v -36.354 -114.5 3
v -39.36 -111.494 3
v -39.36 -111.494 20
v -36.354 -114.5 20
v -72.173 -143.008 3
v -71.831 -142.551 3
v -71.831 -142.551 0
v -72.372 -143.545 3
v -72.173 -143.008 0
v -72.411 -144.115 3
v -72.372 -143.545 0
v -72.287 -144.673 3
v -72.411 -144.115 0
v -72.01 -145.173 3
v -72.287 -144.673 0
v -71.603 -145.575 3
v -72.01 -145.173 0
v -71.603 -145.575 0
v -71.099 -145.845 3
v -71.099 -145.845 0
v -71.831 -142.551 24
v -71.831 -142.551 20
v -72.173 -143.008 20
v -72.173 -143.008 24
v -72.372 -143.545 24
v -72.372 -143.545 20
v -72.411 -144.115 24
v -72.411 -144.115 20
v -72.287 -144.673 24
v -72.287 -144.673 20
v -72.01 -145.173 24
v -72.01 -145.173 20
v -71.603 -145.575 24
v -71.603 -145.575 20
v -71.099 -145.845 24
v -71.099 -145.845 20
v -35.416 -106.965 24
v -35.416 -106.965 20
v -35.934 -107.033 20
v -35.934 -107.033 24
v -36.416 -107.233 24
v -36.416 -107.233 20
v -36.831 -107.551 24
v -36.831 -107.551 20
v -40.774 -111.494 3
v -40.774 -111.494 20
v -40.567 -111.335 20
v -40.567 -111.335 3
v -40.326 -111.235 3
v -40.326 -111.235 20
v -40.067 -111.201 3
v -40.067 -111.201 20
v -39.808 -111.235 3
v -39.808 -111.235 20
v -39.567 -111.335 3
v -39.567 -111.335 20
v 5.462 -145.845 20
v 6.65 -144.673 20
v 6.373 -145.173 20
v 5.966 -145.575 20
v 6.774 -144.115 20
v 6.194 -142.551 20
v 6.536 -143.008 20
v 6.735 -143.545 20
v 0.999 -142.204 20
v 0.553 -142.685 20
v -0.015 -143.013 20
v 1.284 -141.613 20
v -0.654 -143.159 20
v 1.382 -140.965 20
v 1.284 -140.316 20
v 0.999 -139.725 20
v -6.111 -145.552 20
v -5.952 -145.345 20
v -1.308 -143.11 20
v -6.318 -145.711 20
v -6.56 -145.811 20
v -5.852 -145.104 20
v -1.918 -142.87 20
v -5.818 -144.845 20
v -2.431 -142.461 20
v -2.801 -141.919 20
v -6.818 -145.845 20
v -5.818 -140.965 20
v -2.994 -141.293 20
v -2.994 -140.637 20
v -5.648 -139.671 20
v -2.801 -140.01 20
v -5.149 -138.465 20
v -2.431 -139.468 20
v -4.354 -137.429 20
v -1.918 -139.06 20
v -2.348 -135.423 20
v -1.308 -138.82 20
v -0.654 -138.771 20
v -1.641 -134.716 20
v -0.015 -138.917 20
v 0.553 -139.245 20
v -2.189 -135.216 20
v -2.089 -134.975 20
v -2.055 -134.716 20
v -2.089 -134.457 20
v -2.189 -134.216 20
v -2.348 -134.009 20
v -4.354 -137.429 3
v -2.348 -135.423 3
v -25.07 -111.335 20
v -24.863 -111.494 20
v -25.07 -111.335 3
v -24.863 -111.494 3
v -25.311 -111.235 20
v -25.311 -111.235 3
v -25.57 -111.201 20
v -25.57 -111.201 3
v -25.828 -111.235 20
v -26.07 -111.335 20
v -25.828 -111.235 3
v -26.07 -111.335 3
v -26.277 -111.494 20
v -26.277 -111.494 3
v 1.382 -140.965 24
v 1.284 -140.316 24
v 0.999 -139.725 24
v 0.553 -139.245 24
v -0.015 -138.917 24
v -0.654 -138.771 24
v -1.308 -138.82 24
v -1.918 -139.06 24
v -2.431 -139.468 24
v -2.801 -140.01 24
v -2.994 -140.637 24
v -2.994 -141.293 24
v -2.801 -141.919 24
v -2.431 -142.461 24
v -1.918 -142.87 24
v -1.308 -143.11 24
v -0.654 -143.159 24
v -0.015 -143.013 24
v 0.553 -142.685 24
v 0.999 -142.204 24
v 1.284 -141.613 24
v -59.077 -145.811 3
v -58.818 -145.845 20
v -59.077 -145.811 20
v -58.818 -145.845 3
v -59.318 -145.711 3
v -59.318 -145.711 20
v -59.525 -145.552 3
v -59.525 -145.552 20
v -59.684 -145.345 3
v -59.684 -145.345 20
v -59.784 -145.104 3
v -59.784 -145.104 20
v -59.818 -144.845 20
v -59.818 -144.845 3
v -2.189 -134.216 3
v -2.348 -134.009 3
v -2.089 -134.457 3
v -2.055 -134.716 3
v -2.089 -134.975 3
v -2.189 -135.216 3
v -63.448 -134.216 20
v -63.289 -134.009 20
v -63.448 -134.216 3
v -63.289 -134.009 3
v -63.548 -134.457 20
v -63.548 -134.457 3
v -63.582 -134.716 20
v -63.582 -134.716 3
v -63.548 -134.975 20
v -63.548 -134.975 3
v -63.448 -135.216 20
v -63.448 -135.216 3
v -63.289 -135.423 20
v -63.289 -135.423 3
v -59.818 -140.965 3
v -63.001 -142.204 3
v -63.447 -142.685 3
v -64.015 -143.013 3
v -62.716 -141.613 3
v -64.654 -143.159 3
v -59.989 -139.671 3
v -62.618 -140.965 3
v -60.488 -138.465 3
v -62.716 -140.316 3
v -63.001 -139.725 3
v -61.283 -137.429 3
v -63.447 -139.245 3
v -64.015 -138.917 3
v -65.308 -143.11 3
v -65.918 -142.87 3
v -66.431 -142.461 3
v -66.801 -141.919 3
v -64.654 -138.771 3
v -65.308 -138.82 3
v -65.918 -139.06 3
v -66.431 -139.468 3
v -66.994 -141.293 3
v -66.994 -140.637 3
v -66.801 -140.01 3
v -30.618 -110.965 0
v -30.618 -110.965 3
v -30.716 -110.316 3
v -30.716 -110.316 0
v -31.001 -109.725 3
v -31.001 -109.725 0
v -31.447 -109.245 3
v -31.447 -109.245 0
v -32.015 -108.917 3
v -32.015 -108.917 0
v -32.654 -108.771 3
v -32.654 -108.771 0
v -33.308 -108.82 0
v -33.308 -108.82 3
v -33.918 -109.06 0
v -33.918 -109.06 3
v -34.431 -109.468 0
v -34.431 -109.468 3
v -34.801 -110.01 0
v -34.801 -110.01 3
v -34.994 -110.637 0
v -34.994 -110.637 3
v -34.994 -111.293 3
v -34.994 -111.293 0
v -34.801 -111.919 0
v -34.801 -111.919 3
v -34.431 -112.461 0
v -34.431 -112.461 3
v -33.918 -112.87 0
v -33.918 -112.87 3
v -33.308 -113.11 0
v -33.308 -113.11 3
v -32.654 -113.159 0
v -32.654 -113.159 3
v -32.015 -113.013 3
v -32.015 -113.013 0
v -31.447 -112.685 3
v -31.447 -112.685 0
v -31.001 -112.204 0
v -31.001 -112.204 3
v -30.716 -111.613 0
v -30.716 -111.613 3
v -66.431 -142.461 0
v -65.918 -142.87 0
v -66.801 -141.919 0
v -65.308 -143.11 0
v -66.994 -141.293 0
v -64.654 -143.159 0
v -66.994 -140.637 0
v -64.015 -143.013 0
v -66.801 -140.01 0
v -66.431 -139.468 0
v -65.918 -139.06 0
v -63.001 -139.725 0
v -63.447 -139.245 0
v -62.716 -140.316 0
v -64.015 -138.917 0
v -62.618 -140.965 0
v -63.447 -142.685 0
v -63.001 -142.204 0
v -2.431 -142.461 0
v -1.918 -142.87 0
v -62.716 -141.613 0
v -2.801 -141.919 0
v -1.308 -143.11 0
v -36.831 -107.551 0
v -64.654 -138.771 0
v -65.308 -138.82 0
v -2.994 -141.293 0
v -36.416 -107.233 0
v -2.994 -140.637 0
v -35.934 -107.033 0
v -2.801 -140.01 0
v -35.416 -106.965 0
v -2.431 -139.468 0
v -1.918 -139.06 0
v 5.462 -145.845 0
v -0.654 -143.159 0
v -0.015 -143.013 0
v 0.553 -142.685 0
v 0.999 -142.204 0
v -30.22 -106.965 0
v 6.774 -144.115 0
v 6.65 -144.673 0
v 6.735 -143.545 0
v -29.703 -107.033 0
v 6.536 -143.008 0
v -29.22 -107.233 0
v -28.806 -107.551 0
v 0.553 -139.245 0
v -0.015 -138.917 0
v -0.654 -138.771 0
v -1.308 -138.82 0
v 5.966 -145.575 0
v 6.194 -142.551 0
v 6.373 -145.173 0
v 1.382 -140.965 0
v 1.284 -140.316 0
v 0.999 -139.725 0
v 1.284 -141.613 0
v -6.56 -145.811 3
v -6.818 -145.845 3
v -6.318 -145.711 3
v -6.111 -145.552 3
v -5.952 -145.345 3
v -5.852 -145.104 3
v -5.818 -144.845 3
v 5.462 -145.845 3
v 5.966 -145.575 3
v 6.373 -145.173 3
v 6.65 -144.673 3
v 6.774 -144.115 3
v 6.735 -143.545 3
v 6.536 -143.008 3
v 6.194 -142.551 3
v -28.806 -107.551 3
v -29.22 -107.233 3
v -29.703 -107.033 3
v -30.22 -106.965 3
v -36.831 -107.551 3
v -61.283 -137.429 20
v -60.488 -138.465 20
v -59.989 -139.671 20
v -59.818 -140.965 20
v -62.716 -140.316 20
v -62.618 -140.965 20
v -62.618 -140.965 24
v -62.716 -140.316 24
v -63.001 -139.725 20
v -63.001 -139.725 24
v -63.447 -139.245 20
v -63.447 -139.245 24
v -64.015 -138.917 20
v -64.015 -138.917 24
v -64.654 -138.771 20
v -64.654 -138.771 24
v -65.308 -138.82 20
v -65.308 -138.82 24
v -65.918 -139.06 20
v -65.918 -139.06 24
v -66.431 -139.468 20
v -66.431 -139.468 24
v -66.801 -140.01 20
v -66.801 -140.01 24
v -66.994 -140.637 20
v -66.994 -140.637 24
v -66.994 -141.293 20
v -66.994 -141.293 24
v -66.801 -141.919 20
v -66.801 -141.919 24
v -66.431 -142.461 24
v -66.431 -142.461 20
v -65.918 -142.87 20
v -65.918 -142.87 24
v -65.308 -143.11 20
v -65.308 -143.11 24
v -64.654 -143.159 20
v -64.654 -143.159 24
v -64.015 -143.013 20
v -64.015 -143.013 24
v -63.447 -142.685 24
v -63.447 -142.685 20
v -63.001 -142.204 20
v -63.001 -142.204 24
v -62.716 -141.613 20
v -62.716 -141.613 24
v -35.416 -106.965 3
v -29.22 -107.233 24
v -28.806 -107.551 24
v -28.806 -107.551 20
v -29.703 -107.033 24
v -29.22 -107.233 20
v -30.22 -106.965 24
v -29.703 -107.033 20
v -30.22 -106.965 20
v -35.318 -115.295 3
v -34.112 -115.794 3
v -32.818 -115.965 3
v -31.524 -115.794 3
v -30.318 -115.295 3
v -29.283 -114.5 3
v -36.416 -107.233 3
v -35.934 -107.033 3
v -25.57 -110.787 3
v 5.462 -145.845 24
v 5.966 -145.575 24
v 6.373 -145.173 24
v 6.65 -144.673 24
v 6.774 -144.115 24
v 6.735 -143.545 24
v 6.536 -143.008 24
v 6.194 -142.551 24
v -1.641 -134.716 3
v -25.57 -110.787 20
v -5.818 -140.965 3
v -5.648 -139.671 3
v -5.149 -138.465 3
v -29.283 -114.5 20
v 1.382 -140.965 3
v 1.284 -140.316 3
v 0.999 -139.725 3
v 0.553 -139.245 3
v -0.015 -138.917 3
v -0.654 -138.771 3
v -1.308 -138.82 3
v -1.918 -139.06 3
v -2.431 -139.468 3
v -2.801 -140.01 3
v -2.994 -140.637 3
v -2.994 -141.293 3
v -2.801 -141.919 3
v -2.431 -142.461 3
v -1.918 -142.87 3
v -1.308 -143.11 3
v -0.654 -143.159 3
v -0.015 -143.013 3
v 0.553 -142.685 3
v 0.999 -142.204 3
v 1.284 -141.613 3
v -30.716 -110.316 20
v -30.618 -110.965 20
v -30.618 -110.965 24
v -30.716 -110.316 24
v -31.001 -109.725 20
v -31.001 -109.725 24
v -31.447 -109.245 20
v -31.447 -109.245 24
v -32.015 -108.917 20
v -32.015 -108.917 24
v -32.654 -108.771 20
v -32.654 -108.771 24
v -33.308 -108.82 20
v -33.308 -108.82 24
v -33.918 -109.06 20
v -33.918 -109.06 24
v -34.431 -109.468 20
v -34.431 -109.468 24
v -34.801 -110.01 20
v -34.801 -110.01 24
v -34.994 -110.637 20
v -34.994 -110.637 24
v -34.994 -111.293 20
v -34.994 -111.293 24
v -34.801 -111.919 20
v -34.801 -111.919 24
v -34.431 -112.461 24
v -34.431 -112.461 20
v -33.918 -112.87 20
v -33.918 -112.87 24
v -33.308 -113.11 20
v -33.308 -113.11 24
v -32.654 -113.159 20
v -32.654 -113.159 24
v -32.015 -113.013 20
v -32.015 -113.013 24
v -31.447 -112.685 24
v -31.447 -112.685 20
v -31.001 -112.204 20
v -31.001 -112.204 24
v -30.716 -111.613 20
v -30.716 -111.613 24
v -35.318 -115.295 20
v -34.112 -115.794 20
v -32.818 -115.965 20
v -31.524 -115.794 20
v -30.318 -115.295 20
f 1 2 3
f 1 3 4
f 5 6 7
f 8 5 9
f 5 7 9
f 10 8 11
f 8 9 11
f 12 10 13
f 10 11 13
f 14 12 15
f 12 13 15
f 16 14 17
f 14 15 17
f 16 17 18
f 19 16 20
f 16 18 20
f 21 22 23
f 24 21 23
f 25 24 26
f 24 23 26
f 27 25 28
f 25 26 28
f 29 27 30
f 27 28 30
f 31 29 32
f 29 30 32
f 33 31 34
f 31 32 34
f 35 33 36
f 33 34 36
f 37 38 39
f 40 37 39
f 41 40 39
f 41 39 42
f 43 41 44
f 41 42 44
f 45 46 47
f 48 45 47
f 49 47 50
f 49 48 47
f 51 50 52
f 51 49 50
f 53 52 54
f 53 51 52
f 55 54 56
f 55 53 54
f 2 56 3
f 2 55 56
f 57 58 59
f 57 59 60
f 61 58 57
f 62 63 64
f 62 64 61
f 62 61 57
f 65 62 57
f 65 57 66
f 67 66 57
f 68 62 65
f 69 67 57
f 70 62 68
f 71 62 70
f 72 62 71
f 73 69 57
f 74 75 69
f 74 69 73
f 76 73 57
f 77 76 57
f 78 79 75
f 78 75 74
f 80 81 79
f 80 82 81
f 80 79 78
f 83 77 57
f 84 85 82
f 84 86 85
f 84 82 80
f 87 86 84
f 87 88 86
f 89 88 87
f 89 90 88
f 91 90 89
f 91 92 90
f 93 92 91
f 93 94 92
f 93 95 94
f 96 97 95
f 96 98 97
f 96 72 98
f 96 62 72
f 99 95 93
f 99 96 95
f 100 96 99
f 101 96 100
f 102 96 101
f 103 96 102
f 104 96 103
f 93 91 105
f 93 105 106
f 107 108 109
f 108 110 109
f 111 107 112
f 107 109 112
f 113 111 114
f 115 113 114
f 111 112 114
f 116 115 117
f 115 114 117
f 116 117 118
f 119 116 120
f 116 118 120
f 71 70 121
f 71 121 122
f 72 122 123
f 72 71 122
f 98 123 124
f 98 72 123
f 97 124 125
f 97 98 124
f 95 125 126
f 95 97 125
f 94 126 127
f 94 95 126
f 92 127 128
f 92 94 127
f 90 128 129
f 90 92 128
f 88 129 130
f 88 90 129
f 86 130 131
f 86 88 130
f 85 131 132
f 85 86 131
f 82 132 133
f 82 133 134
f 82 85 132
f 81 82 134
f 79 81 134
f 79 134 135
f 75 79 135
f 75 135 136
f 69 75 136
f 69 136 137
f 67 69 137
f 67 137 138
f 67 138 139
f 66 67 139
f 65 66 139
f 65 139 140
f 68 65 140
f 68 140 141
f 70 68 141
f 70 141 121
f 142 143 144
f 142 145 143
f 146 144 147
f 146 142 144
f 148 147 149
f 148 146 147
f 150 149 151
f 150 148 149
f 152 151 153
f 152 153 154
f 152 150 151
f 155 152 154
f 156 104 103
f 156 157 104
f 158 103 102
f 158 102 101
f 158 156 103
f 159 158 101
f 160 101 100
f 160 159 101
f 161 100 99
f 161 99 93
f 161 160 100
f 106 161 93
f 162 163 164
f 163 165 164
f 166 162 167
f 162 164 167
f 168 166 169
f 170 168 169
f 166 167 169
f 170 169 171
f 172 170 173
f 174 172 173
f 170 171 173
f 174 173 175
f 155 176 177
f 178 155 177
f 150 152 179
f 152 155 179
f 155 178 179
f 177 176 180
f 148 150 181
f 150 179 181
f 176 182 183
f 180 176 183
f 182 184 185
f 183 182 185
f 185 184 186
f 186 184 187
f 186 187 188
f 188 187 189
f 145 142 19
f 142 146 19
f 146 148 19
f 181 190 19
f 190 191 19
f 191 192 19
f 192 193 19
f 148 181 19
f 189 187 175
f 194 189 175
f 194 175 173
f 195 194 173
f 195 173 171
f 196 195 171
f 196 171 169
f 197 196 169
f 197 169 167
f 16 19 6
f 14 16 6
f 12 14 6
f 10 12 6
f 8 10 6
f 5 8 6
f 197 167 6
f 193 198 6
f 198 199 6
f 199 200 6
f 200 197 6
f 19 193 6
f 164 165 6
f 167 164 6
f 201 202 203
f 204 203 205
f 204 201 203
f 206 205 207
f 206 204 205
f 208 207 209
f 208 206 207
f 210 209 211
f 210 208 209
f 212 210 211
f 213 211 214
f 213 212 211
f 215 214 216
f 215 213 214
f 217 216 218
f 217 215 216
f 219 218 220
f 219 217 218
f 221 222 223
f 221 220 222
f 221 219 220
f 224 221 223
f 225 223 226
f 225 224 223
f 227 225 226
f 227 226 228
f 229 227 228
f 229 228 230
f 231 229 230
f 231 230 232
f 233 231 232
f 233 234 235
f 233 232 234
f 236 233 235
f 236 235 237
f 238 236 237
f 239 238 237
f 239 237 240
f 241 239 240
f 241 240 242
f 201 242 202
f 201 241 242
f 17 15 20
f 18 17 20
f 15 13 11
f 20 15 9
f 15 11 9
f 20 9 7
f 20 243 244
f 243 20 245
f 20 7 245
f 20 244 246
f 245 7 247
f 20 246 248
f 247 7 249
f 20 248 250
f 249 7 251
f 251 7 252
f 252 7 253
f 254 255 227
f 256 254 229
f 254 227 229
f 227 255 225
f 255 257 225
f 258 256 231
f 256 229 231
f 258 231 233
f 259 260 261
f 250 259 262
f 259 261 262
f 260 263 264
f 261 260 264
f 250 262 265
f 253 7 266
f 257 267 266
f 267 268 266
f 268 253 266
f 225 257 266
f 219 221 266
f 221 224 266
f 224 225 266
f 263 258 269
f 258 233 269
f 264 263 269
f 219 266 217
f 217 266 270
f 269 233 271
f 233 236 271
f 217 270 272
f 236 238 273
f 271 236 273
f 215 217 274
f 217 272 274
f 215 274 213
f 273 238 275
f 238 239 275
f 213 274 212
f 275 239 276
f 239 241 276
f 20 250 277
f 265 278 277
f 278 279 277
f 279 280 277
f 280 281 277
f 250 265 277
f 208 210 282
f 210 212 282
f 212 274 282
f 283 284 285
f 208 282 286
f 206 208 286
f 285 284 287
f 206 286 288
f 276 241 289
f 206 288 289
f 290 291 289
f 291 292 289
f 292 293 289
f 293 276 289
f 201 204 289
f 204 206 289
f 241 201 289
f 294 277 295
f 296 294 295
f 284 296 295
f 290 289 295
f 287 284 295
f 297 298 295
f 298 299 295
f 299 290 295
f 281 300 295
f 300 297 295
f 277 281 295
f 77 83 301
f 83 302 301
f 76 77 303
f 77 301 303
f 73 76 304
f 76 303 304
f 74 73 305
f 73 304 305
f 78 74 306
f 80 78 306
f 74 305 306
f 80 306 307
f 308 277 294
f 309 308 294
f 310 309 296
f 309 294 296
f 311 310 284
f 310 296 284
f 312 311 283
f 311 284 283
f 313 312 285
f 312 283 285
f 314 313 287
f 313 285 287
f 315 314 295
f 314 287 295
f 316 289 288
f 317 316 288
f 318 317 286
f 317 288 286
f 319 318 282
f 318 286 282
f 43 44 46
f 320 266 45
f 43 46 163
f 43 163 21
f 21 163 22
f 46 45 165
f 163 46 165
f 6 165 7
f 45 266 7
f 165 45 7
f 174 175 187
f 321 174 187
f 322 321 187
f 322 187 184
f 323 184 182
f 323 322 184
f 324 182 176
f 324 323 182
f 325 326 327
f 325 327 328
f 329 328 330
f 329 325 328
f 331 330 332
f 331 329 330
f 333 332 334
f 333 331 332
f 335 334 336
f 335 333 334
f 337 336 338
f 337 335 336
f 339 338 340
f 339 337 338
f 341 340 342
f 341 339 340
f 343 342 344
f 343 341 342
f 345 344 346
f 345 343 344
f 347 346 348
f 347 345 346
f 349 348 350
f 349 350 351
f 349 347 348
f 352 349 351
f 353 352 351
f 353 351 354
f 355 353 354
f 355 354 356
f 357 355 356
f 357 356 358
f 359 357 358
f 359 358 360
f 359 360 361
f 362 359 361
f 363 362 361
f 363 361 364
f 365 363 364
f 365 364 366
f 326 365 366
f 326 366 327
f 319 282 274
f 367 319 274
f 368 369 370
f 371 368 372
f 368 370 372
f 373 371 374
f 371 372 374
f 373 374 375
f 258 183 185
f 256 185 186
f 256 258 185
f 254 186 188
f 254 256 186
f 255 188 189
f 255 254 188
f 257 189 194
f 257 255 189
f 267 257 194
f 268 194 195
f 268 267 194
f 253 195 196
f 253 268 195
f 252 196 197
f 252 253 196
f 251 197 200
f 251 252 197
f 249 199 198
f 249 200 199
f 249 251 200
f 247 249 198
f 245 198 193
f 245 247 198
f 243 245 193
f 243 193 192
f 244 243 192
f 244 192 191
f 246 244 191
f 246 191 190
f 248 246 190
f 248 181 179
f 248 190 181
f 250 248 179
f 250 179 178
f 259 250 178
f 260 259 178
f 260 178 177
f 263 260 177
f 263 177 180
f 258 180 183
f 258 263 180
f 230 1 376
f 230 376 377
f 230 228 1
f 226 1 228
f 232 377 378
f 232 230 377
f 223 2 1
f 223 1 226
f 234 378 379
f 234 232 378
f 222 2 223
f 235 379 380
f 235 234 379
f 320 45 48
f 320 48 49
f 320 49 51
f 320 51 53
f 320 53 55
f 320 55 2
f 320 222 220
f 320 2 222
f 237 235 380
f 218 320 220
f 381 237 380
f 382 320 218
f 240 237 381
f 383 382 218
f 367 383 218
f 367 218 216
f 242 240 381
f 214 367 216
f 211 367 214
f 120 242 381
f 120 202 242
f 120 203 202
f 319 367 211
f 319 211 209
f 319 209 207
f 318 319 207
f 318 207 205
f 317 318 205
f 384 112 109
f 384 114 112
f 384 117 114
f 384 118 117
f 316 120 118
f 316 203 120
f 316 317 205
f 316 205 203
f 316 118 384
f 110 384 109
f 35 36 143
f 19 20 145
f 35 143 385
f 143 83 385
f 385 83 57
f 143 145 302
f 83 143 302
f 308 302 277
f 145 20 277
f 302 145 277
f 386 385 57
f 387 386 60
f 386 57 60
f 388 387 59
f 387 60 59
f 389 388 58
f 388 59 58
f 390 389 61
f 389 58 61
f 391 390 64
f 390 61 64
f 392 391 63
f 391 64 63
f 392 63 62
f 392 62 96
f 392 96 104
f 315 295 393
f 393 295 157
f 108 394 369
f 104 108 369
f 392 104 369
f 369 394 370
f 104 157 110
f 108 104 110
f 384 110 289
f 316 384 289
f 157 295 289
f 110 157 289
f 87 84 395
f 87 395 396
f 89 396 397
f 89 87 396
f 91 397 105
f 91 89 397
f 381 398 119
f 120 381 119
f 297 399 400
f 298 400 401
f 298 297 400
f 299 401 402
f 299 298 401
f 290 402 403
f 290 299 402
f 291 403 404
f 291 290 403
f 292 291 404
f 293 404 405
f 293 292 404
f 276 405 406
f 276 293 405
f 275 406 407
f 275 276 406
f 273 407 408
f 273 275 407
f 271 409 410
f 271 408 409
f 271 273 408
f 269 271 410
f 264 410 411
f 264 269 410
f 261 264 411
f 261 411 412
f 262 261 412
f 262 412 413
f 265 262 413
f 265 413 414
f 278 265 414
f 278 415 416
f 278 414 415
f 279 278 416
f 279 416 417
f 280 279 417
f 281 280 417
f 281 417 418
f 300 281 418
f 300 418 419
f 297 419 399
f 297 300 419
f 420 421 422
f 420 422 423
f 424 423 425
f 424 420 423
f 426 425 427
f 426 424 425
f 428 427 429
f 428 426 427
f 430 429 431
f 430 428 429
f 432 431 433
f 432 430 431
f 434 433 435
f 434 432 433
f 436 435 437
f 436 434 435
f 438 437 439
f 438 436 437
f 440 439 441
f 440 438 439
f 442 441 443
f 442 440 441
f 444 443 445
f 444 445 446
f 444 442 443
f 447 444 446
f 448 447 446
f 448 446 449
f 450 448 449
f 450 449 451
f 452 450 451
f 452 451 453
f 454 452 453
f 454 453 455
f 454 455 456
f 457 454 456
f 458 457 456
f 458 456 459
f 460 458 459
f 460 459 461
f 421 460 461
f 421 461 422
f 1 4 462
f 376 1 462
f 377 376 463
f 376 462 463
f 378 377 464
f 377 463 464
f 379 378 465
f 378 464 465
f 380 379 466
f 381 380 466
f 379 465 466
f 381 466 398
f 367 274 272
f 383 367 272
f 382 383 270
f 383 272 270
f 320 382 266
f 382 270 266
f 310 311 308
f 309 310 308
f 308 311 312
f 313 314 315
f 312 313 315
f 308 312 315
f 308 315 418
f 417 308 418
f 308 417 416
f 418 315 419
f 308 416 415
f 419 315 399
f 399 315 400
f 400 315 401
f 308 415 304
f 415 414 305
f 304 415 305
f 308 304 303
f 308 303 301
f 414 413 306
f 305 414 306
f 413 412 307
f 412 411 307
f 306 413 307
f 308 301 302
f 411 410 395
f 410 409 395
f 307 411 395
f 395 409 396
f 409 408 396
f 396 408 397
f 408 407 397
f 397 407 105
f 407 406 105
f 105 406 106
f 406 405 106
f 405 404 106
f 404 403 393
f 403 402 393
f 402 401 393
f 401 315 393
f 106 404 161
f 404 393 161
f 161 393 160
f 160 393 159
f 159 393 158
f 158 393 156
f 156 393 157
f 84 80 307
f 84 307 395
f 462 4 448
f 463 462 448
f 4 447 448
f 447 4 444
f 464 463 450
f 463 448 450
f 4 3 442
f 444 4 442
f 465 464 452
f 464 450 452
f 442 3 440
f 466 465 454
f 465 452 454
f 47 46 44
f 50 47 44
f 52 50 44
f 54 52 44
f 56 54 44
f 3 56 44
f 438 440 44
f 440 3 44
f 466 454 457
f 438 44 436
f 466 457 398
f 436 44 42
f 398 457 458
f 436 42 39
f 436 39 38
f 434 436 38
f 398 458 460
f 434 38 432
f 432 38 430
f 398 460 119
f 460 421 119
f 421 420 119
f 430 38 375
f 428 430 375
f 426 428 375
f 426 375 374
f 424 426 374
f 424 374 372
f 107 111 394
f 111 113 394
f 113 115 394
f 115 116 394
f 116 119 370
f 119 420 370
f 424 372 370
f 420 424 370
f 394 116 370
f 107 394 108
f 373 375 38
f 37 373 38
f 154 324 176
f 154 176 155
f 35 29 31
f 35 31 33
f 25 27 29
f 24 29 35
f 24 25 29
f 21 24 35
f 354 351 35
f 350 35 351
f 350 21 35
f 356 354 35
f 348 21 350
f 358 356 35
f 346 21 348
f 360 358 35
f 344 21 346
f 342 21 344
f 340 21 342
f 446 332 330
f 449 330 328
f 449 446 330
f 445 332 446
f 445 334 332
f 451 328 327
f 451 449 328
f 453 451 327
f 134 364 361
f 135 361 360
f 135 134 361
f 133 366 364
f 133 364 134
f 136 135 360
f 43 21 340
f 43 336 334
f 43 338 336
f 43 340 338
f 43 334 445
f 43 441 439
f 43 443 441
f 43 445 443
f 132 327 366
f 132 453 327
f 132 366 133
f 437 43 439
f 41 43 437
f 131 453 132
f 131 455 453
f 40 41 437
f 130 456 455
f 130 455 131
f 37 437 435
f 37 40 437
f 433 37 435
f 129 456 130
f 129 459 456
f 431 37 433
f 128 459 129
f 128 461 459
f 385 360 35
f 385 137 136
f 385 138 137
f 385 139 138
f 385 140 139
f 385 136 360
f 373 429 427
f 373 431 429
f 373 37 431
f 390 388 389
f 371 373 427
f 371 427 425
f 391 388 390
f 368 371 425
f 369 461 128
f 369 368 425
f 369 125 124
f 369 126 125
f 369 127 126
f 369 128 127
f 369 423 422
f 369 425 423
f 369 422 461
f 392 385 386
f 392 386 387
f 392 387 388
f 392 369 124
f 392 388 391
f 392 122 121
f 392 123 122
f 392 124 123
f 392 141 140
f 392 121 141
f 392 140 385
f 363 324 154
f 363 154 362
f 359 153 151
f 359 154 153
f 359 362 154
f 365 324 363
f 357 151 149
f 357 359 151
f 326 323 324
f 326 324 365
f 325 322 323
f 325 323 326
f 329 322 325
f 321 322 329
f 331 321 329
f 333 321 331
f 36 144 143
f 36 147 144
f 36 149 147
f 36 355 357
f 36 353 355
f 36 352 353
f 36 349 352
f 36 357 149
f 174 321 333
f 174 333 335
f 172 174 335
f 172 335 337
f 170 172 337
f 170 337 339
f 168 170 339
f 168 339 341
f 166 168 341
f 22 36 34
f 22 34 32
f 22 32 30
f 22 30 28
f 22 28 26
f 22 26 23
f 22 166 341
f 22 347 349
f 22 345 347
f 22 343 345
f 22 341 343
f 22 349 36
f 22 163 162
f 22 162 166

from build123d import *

# Parameters (mm, degrees)
SKETCH_1_R          = 2.2
EXTRUDE_1_DEPTH     = 24
CUT_EXTRUDE_START   = -4
CUT_EXTRUDE_1_DEPTH = 17
FILLET_1_R          = 1


with BuildPart() as part:
    # 草图1 → 凸台-拉伸1 (new body)
    with BuildSketch(Plane.XY):
        with BuildLine():
            ThreePointArc((-71.830585516, -142.550559143), (-72.368769012, -144.398530389), (-71.098720838, -145.844772706))
            Line((-71.098720838, -145.844772706), (5.461936424, -145.844772706))
            ThreePointArc((5.461936424, -145.844772706), (6.731984597, -144.398530389), (6.193801102, -142.550559143))
            Line((6.193801102, -142.550559143), (-28.806198899, -107.550559143))
            ThreePointArc((-28.806198899, -107.550559143), (-29.455045597, -107.11701364), (-30.220412461, -106.964772705))
            Line((-30.220412461, -106.964772705), (-35.416371953, -106.964772705))
            ThreePointArc((-35.416371953, -106.964772705), (-36.181738818, -107.11701364), (-36.830585516, -107.550559143))
            Line((-36.830585516, -107.550559143), (-71.830585516, -142.550559143))
        make_face()
        with Locations((-64.818392207, -140.964772706)):
            Circle(SKETCH_1_R, mode=Mode.SUBTRACT)
        with Locations((-0.818392207, -140.964772706)):
            Circle(SKETCH_1_R, mode=Mode.SUBTRACT)
        with Locations((-32.818392207, -110.964772705)):
            Circle(SKETCH_1_R, mode=Mode.SUBTRACT)
    extrude(amount=EXTRUDE_1_DEPTH)

    # 草图2 → 切除-拉伸1 (cut)
    with BuildSketch(Plane.XY.offset(24).offset(CUT_EXTRUDE_START)):
        with BuildLine():
            Line((-40.067129549, -110.787103176), (-36.353926113, -114.500306611))
            ThreePointArc((-36.353926113, -114.500306611), (-32.818392207, -115.964772705), (-29.282858301, -114.500306611))
            Line((-29.282858301, -114.500306611), (-25.569654866, -110.787103176))
            Line((-25.569654866, -110.787103176), (-32.818392207, -103.538365834))
            Line((-32.818392207, -103.538365834), (-40.067129549, -110.787103176))
        make_face()
        with BuildLine():
            Line((-63.996061737, -134.716035364), (-61.282858301, -137.4292388))
            ThreePointArc((-61.282858301, -137.4292388), (-60.198994545, -139.051355544), (-59.818392207, -140.964772706))
            Line((-59.818392207, -140.964772706), (-59.818392207, -145.844772706))
            Line((-59.818392207, -145.844772706), (-75.124799079, -145.844772706))
            Line((-75.124799079, -145.844772706), (-63.996061737, -134.716035364))
        make_face()
        with BuildLine():
            Line((9.488014664, -145.844772706), (-5.818392207, -145.844772706))
            Line((-5.818392207, -145.844772706), (-5.818392207, -140.964772706))
            ThreePointArc((-5.818392207, -140.964772706), (-5.43778987, -139.051355544), (-4.353926113, -137.4292388))
            Line((-4.353926113, -137.4292388), (-1.640722678, -134.716035364))
            Line((-1.640722678, -134.716035364), (9.488014664, -145.844772706))
        make_face()
    extrude(amount=-CUT_EXTRUDE_1_DEPTH, mode=Mode.SUBTRACT)

    # 圆角1
    fillet_1_edges = [part.edges().sort_by_distance(p)[0] for p in [
        (-59.818392207, -145.844772706, 11.5),
        (-63.996061737, -134.716035364, 11.5),
        (-1.640722678, -134.716035364, 11.5),
        (-5.818392207, -145.844772706, 11.5),
        (-40.067129549, -110.787103176, 11.5),
        (-25.569654866, -110.787103176, 11.5),
    ]]
    fillet(fillet_1_edges, radius=FILLET_1_R)


solid = part.part
